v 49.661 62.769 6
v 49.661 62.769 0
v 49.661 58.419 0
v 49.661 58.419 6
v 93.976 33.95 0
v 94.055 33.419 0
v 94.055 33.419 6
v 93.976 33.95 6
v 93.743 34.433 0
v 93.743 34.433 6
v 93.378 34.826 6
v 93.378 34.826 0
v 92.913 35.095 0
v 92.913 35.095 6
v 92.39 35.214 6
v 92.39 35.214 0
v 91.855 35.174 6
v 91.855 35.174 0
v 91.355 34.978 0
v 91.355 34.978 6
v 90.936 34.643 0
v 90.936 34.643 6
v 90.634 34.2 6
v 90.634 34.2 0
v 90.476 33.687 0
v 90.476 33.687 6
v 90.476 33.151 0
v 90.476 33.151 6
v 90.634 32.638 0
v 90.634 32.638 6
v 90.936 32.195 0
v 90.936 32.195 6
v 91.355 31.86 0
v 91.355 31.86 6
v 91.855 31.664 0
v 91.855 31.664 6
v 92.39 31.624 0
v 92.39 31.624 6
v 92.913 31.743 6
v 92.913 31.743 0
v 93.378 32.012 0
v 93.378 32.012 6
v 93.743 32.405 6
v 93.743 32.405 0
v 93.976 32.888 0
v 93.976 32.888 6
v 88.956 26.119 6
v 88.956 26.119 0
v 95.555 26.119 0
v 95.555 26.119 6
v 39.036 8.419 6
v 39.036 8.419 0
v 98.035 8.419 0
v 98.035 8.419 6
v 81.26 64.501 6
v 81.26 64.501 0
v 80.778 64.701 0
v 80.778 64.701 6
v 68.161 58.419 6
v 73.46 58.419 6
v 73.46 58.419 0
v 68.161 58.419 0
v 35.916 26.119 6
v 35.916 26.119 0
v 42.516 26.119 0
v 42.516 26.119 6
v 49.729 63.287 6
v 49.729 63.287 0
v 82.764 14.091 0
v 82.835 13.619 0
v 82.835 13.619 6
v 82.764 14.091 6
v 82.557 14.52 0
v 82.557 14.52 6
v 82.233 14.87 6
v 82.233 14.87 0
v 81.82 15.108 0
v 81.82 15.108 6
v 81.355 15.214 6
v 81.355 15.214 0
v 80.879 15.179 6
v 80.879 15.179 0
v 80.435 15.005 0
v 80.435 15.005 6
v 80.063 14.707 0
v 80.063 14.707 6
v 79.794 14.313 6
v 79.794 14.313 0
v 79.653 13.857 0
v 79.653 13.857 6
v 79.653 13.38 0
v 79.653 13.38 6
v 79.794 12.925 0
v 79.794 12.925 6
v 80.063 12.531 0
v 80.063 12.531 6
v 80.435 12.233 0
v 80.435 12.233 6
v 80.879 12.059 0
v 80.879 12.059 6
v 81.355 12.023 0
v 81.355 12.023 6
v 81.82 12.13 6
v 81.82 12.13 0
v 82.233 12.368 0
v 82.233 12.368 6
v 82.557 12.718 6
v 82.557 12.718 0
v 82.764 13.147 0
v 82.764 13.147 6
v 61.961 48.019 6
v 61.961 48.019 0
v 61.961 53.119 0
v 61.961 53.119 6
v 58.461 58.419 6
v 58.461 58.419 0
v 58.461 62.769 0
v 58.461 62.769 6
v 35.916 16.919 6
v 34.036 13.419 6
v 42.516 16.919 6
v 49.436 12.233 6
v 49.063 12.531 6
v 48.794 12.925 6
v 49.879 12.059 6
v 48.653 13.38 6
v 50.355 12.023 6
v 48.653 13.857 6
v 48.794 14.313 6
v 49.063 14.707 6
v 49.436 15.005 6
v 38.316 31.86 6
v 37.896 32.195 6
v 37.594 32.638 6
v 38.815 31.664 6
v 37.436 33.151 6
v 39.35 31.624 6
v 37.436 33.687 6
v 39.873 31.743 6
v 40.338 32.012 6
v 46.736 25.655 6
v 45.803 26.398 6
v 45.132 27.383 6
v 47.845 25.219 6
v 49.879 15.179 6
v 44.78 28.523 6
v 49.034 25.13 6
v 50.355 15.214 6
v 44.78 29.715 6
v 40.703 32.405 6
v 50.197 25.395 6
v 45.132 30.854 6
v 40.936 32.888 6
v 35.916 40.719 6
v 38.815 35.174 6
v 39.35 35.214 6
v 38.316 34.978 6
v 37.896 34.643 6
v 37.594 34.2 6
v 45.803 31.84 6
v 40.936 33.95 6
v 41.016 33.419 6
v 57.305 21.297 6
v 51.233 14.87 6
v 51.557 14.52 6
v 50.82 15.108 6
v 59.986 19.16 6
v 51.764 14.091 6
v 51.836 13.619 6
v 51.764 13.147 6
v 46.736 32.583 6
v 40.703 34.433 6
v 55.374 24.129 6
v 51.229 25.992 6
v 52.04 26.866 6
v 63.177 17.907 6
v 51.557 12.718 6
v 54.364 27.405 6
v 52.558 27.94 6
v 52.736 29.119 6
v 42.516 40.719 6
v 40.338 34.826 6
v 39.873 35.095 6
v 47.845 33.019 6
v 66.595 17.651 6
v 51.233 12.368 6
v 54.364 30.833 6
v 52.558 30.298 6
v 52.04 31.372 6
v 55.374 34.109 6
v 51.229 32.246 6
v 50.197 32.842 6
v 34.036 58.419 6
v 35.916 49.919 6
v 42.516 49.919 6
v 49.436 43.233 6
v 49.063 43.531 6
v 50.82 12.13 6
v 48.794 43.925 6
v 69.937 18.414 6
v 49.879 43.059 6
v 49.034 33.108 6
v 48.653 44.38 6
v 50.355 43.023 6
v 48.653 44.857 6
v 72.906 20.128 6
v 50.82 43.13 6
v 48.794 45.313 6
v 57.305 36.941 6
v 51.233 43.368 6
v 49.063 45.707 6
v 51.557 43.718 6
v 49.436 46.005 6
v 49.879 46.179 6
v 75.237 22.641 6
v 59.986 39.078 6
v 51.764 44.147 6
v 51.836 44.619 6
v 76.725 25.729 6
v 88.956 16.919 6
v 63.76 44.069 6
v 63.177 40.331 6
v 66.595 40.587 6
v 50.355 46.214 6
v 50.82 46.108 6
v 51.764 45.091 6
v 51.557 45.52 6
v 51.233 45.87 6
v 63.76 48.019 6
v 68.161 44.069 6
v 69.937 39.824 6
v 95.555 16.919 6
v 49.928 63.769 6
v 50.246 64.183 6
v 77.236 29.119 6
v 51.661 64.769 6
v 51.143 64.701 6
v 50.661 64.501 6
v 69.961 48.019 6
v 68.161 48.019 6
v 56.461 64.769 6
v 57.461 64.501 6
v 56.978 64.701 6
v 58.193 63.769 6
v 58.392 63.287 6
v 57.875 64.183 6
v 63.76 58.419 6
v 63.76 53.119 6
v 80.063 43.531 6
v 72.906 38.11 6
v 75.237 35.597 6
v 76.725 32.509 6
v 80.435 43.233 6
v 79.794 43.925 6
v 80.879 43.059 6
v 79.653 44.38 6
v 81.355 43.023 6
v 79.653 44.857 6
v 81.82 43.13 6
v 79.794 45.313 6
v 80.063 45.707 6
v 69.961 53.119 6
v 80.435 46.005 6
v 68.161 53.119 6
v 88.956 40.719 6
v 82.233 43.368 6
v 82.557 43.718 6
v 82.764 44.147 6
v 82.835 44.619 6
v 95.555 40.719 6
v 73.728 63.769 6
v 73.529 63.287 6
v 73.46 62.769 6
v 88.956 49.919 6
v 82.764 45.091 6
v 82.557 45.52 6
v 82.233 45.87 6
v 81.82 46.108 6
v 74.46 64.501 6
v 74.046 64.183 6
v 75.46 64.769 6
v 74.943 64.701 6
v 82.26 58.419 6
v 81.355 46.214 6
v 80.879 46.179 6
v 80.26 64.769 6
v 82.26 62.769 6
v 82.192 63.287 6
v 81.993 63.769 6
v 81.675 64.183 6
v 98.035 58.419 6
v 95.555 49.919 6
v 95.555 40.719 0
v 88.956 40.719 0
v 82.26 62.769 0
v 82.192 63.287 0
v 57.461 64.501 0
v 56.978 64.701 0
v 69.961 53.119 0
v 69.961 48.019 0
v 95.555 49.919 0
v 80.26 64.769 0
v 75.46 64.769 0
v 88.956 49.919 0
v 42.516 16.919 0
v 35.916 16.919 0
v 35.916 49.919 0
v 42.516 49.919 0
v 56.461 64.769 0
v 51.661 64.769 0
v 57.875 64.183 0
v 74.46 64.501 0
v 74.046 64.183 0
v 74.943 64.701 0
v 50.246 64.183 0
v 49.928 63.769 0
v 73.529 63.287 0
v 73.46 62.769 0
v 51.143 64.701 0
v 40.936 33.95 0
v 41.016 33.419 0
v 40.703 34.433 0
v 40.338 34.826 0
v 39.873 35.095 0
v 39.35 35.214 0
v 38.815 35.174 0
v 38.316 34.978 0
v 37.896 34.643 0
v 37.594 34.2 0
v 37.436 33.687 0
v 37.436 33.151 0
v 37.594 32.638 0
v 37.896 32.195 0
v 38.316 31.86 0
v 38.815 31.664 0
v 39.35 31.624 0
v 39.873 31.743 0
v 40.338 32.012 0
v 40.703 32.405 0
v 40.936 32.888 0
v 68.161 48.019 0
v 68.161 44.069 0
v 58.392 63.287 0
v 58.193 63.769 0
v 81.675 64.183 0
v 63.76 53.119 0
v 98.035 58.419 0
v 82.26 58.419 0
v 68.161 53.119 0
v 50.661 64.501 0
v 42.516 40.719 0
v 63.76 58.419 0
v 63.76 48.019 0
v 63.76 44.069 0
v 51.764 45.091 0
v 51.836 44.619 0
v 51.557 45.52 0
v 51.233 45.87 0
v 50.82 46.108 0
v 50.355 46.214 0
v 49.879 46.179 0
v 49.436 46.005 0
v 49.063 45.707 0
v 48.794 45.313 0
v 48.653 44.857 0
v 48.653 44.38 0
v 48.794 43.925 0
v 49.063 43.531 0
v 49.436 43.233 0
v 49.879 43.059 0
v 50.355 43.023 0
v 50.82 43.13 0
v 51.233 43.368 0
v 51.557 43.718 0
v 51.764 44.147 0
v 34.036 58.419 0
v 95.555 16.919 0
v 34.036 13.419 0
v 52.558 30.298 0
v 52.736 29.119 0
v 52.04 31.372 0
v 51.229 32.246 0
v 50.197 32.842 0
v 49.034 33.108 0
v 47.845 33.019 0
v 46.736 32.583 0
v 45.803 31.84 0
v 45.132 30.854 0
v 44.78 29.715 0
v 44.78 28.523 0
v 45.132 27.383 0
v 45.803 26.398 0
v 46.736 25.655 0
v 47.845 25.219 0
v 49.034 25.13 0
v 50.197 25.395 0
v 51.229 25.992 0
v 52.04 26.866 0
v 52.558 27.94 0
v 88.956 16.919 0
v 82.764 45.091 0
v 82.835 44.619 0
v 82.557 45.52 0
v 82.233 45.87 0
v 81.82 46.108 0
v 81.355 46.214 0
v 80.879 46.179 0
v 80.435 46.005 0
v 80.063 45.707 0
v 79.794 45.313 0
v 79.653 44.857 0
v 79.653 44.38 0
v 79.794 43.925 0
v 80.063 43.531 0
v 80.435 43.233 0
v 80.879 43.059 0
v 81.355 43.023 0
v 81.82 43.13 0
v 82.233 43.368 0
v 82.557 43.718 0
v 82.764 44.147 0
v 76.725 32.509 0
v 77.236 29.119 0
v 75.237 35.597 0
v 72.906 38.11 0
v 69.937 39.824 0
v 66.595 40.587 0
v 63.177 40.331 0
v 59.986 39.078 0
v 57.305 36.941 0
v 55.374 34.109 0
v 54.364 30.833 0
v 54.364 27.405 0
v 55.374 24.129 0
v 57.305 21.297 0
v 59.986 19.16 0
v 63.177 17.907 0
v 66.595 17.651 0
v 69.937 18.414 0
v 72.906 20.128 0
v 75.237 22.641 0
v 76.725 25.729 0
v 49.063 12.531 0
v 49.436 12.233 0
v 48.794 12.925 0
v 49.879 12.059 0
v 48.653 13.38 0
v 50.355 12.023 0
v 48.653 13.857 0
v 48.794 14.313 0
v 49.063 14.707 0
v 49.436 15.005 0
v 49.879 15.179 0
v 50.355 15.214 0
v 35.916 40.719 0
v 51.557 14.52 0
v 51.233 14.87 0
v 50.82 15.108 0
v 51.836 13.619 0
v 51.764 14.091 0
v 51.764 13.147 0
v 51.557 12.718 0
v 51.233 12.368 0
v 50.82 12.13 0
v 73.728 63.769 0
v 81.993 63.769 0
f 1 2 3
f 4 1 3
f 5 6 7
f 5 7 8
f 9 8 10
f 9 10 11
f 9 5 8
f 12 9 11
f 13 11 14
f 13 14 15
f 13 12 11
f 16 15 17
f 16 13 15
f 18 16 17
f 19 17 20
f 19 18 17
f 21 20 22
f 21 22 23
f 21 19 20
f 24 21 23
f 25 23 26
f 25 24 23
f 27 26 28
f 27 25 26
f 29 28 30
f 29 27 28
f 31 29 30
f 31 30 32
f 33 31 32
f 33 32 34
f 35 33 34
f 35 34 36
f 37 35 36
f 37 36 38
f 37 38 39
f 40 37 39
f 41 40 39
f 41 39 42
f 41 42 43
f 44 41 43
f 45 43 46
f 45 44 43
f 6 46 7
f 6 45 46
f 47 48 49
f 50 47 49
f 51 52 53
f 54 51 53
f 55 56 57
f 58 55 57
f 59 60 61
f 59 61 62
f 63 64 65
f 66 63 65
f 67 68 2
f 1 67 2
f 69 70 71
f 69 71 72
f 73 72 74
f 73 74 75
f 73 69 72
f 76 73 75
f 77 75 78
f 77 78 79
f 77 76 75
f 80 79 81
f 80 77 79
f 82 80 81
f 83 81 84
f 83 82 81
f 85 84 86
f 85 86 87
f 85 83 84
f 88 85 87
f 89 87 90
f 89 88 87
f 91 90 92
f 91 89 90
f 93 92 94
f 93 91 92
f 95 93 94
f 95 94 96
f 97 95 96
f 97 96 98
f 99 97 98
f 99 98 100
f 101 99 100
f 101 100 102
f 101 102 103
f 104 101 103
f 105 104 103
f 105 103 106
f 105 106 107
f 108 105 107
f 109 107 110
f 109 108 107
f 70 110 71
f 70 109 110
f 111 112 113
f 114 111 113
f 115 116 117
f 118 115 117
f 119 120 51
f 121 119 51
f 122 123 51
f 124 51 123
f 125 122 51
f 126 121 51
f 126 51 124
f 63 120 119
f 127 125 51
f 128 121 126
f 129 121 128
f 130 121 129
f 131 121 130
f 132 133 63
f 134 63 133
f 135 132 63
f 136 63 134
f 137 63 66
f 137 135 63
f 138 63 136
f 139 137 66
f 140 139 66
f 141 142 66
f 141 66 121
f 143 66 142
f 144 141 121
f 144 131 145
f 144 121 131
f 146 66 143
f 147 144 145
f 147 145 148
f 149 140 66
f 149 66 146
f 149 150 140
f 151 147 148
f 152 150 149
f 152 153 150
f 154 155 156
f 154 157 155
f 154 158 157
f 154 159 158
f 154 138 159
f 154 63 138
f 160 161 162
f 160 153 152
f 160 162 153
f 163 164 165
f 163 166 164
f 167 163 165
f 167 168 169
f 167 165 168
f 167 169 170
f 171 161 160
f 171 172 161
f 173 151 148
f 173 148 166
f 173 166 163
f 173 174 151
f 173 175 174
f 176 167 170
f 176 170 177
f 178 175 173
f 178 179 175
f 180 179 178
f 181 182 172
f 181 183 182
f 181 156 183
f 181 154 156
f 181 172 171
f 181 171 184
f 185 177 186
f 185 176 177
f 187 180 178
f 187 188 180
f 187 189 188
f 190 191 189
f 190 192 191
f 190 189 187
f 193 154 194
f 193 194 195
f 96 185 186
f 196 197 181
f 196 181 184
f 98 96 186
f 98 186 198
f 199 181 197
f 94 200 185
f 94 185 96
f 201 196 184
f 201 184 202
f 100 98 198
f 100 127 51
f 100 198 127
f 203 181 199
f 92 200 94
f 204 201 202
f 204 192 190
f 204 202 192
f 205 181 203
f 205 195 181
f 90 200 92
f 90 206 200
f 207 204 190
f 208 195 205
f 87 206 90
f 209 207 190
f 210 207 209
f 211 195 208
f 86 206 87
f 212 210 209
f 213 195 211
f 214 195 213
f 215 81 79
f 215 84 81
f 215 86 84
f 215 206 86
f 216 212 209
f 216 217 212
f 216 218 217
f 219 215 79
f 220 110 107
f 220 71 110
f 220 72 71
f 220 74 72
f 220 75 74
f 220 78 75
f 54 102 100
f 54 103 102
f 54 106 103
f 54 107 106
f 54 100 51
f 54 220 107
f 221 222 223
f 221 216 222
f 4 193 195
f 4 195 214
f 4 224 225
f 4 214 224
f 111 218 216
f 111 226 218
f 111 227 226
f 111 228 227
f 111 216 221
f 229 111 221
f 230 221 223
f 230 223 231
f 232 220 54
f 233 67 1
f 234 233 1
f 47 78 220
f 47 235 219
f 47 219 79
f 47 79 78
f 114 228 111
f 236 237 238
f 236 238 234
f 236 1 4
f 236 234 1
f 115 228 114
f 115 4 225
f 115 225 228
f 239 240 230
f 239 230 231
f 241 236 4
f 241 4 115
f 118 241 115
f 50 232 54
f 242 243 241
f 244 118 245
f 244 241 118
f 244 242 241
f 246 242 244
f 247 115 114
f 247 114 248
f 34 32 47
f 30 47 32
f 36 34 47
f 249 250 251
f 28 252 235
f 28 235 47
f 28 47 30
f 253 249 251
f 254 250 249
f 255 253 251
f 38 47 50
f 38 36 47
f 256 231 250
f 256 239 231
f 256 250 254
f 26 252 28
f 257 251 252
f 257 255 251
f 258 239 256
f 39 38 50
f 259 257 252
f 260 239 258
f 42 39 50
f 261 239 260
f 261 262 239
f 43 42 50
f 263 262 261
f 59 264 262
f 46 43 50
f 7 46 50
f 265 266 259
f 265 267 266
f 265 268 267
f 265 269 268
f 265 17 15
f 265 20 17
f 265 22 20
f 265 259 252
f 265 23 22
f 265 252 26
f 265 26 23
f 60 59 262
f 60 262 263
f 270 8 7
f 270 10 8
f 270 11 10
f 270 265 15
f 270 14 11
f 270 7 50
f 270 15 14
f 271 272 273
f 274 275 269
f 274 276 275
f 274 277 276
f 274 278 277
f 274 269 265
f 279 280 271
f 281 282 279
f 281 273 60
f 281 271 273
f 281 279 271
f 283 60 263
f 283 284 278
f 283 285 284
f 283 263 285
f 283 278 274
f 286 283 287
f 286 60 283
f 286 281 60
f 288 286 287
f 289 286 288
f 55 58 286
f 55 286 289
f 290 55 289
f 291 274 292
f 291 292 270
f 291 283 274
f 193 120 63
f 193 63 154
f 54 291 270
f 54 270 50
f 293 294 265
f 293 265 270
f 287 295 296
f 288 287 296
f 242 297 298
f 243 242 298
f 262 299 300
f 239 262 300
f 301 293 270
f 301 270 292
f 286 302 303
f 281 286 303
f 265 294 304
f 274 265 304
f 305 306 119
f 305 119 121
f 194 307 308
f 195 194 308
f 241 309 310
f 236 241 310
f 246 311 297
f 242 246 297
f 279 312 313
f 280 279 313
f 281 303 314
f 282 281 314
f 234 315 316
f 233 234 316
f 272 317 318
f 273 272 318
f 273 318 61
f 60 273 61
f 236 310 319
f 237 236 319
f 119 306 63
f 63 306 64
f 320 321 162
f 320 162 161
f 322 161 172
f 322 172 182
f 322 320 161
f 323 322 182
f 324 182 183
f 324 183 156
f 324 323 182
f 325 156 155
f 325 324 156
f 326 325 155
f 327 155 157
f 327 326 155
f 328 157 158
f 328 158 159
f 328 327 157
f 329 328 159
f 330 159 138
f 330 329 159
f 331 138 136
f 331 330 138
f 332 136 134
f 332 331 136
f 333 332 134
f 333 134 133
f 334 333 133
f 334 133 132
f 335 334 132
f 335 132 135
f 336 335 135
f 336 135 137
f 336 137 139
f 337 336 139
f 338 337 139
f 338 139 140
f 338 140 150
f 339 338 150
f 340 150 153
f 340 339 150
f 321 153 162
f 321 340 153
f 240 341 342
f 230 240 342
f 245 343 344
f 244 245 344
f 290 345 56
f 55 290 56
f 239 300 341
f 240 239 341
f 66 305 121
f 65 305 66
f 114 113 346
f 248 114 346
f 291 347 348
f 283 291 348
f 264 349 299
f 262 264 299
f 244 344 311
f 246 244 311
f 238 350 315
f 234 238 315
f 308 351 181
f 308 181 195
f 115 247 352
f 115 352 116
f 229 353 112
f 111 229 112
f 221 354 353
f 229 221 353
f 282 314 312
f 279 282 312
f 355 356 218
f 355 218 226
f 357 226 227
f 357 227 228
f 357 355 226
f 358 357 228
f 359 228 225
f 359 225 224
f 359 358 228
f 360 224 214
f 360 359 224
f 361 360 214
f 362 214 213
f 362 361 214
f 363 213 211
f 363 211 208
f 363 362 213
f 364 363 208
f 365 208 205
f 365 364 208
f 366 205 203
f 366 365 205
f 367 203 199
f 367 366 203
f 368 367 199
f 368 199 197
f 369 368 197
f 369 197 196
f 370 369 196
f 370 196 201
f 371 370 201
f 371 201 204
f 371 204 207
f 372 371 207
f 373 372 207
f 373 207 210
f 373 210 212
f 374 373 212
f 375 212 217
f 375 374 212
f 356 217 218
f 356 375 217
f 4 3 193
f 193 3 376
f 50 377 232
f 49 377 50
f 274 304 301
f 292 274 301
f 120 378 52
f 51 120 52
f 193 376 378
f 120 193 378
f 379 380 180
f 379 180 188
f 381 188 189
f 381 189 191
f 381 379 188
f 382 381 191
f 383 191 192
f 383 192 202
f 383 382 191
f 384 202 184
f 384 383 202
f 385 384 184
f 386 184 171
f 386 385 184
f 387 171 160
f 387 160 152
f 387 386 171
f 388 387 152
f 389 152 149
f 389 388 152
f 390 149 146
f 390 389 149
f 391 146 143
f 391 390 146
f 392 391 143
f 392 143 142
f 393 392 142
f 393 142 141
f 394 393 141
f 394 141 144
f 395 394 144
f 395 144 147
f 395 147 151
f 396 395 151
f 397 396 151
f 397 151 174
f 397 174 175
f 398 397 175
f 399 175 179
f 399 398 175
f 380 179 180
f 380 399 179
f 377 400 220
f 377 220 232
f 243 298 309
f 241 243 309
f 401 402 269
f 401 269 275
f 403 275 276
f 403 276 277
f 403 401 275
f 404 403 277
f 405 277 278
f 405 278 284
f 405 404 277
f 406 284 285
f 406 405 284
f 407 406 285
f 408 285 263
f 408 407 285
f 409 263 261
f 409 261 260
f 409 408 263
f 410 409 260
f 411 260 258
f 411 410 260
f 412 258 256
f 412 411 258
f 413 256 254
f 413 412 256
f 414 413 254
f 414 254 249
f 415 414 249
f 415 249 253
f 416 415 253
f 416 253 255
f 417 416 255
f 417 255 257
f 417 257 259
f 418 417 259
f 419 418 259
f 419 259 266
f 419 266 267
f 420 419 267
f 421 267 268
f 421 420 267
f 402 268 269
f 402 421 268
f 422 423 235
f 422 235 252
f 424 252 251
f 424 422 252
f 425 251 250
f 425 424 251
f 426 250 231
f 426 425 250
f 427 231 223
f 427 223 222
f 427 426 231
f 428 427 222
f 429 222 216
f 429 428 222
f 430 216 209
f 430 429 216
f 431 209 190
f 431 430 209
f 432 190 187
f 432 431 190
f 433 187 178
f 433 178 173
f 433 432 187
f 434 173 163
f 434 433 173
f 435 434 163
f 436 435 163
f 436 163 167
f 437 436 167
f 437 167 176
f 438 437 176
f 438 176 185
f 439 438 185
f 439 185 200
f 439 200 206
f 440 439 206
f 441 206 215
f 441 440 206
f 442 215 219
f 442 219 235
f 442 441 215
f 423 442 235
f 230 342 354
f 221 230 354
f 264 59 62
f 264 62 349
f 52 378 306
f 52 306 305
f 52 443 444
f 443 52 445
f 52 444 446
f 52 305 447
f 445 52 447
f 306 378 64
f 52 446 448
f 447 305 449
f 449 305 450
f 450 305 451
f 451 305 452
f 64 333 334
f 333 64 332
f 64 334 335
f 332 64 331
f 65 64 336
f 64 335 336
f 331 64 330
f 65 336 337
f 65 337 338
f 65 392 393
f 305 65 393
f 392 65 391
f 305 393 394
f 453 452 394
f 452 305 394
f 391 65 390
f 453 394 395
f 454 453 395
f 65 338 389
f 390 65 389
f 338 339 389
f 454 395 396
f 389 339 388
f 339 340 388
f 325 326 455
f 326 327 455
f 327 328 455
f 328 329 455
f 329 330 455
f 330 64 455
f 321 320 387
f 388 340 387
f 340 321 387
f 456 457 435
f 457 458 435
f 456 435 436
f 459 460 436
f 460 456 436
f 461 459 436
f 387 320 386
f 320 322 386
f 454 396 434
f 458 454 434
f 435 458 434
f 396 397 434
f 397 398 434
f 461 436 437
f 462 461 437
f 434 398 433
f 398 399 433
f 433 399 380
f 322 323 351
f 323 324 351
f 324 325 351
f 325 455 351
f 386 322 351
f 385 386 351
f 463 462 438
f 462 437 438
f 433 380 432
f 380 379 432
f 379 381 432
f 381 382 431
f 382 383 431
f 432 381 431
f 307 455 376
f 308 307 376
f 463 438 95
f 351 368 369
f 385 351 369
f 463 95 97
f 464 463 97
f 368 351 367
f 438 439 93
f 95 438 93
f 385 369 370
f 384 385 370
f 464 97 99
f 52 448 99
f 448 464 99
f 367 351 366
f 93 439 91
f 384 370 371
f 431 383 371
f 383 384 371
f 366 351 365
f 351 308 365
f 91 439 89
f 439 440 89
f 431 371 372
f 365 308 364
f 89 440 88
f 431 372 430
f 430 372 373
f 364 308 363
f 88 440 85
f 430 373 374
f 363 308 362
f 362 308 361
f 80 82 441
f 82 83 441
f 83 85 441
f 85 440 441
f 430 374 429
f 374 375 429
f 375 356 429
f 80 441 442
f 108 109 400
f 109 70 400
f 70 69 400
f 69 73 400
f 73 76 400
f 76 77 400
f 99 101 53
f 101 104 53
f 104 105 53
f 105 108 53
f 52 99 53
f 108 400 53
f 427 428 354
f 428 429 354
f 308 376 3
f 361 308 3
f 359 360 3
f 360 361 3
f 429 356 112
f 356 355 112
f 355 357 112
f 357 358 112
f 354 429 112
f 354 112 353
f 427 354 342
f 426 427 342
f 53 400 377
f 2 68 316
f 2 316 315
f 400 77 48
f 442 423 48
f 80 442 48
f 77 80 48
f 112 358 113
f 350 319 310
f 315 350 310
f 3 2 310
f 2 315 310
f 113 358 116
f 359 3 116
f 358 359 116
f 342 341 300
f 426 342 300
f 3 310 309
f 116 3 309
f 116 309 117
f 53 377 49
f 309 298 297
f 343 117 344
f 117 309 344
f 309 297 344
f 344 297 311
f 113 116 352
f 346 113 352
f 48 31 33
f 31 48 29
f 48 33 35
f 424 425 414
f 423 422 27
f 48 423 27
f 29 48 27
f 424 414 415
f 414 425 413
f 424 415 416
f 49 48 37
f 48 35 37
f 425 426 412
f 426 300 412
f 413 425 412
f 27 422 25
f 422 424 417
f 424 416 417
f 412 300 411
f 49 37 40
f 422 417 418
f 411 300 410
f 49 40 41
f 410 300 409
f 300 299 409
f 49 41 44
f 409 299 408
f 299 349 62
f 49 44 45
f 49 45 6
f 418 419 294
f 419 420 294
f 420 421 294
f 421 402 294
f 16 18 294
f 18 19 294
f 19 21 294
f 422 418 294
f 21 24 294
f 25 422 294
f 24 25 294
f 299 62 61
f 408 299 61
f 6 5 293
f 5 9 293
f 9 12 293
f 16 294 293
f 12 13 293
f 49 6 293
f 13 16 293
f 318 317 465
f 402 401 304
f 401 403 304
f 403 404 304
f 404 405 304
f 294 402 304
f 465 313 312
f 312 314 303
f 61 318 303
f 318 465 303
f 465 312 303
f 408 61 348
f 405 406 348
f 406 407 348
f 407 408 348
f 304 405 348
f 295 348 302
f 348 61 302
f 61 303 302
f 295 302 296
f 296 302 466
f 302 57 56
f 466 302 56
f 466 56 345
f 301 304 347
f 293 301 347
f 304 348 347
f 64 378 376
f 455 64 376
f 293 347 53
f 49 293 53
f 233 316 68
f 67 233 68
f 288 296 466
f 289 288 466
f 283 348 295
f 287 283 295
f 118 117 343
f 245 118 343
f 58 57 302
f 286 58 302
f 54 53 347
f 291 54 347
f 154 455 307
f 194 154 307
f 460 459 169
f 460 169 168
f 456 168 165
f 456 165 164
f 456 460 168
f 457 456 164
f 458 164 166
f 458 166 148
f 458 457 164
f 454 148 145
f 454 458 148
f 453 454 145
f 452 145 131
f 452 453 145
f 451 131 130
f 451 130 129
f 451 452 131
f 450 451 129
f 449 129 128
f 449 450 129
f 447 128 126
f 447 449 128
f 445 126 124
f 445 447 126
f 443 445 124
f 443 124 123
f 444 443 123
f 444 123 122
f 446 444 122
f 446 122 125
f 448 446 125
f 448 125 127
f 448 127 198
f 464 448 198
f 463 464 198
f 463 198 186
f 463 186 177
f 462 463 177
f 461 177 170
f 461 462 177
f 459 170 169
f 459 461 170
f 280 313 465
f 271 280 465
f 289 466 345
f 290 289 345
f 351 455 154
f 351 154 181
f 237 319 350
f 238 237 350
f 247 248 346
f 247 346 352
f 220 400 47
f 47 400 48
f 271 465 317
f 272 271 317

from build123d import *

# Parameters (mm, degrees)
MODEL_R                  = 1.6
MODEL_R_2                = 1.8
MODEL_R_3                = 4
MODEL_R_4                = 11.5
MODEL_W                  = 6.599987016
MODEL_H                  = 9.199995837
MODEL_W_2                = 6.600001917
MODEL_H_2                = 9.1999977
RESSALTO_EXTRUS_O1_DEPTH = 6


with BuildPart() as part:
    # Model → Ressalto-extrusão1 (new body)
    with BuildSketch(Plane.XY):
        Polygon((68.160504095, 58.4189533), (68.160504095, 53.118954478), (69.960502327, 53.118954478), (69.960502327, 48.018956714), (68.160504095, 48.018956714), (68.160504095, 44.068956891), (63.760499423, 44.068956891), (63.760499423, 48.018956714), (61.960501191, 48.018956714), (61.960501191, 53.118954478), (63.760499423, 53.118954478), (63.760499423, 58.4189533), (58.460502168, 58.4189533), (58.460502168, 62.768951191), (58.392353821, 63.286589281), (58.192552976, 63.768951191), (57.874715731, 64.183164754), (57.460502168, 64.501001999), (56.978140258, 64.700802844), (56.460502168, 64.768951191), (51.660507726, 64.768951191), (51.142869636, 64.700802844), (50.660507726, 64.501001999), (50.246294164, 64.183164754), (49.928456918, 63.768951191), (49.728656073, 63.286589281), (49.660507726, 62.768951191), (49.660507726, 58.4189533), (34.035520335, 58.4189533), (34.035520335, 13.418967617), (39.035518735, 8.418969217), (98.035493414, 8.418969027), (98.035488298, 58.4189533), (82.260492067, 58.4189533), (82.260492067, 62.768951191), (82.192343719, 63.286589281), (81.992542874, 63.768951191), (81.674705629, 64.183164754), (81.260492067, 64.501001999), (80.778130157, 64.700802844), (80.260492067, 64.768951191), (75.460496102, 64.768951191), (74.942858011, 64.700802844), (74.460496102, 64.501001999), (74.046282539, 64.183164754), (73.728445294, 63.768951191), (73.528644449, 63.286589281), (73.460496102, 62.768951191), (73.460496102, 58.4189533), align=None)
        with Locations((50.235508479, 44.618957639)):
            Circle(MODEL_R, mode=Mode.SUBTRACT)
        with Locations((50.235508479, 13.618967559)):
            Circle(MODEL_R, mode=Mode.SUBTRACT)
        with Locations((81.235498559, 13.618967559)):
            Circle(MODEL_R, mode=Mode.SUBTRACT)
        with Locations((81.235498559, 44.618957639)):
            Circle(MODEL_R, mode=Mode.SUBTRACT)
        with Locations((92.255495512, 33.418961223)):
            Circle(MODEL_R_2, mode=Mode.SUBTRACT)
        with Locations((39.215511525, 33.418961223)):
            Circle(MODEL_R_2, mode=Mode.SUBTRACT)
        with Locations((48.735508959, 29.118962599)):
            Circle(MODEL_R_3, mode=Mode.SUBTRACT)
        with Locations((65.735503519, 29.118962599)):
            Circle(MODEL_R_4, mode=Mode.SUBTRACT)
        with Locations((92.255493633, 45.318957274)):
            Rectangle(MODEL_W, MODEL_H, mode=Mode.SUBTRACT)
        with Locations((39.215512485, 45.318957274)):
            Rectangle(MODEL_W_2, MODEL_H, mode=Mode.SUBTRACT)
        with Locations((39.215512485, 21.518966444)):
            Rectangle(MODEL_W_2, MODEL_H_2, mode=Mode.SUBTRACT)
        with Locations((92.255493633, 21.518966444)):
            Rectangle(MODEL_W, MODEL_H_2, mode=Mode.SUBTRACT)
    extrude(amount=RESSALTO_EXTRUS_O1_DEPTH)


solid = part.part
